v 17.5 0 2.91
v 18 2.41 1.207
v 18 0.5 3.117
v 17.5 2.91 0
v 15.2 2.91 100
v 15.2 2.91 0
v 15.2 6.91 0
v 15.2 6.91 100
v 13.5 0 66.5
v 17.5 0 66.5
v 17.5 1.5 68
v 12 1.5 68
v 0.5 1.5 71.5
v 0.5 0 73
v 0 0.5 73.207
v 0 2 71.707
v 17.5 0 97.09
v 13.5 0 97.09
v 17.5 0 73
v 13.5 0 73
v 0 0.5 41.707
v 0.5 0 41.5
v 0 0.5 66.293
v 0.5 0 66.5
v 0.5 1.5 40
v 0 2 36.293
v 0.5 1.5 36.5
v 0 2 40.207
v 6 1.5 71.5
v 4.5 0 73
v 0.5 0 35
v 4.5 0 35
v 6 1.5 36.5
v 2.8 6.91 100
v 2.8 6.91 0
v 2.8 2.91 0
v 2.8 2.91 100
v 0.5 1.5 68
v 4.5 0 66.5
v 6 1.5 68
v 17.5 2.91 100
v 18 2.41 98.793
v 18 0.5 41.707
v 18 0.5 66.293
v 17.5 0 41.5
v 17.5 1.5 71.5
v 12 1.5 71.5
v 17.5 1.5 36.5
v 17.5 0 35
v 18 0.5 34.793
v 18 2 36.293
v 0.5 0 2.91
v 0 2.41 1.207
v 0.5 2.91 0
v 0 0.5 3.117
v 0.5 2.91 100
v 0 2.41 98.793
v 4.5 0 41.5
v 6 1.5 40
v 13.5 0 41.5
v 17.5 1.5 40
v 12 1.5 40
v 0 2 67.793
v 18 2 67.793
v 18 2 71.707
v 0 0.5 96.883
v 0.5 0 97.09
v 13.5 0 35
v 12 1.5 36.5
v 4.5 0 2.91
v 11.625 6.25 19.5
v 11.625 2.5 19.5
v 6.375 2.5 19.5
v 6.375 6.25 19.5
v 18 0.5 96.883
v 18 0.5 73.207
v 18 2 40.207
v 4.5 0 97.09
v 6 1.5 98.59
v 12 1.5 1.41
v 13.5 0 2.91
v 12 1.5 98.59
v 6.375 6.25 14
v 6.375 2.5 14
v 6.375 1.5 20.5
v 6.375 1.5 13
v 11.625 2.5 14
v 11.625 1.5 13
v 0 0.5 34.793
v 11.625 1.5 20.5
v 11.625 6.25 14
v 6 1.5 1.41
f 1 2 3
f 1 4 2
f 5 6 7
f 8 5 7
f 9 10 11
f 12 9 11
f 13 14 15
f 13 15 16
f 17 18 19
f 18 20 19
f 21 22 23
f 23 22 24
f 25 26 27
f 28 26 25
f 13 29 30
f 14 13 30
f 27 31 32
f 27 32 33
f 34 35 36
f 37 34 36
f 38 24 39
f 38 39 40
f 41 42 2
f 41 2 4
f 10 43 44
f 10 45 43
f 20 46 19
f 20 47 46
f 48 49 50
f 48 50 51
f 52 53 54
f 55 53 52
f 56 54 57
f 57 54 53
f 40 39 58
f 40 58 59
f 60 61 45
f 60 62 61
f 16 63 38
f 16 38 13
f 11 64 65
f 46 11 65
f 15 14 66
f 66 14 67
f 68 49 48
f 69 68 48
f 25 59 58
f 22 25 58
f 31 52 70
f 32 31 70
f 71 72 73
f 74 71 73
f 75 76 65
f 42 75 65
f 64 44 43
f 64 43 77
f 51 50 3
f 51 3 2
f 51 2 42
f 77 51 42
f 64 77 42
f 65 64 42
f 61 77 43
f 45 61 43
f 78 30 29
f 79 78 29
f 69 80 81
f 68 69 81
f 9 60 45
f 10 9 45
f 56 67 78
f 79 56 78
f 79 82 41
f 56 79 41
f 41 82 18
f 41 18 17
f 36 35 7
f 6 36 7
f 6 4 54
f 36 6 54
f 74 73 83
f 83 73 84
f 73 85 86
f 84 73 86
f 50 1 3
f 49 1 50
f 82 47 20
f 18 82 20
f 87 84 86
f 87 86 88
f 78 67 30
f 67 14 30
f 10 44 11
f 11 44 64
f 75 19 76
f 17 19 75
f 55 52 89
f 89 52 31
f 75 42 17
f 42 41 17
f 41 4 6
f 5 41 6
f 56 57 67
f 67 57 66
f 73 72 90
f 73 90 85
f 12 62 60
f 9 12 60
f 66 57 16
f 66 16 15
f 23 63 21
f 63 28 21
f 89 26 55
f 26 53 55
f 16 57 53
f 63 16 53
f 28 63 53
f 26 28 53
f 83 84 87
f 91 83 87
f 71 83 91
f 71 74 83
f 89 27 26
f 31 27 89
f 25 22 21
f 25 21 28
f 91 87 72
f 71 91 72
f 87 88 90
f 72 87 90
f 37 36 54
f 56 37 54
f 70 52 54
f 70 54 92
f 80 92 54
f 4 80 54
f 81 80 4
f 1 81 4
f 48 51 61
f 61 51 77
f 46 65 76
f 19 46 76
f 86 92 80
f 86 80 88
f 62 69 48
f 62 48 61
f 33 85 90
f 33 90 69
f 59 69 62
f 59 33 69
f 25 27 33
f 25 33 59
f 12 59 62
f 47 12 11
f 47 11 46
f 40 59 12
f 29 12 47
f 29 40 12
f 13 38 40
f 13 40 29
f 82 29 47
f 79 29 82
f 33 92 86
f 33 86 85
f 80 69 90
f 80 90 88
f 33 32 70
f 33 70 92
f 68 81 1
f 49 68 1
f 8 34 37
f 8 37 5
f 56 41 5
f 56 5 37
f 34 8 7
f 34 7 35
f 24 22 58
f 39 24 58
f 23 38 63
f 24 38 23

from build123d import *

# Parameters (mm, degrees)
F1_DEPTH      = 100
F3_DEPTH      = 25
F3_DEPTH_BACK = 25
F4_SIZE       = 2.90999
F5_SIZE       = 2.90999
F7_DEPTH      = 6.25
F8_SIZE       = 1
F9_C1_SIZE    = 0.5
F9_C2_SIZE    = 0.5
F9_C3_SIZE    = 0.5
F9_C4_SIZE    = 0.5
F9_C5_SIZE    = 0.5
F9_C6_SIZE    = 0.5
F9_C7_SIZE    = 0.5
F9_C8_SIZE    = 0.5
F9_C9_SIZE    = 0.5
F9_C10_SIZE   = 0.5
F9_C11_SIZE   = 0.5
F9_C12_SIZE   = 0.5
F9_C13_SIZE   = 0.5
F9_C14_SIZE   = 0.5
F9_C15_SIZE   = 0.5
F9_C16_SIZE   = 0.5
F9_C17_SIZE   = 0.5
F9_C18_SIZE   = 0.5
F9_C19_SIZE   = 0.5
F9_C20_SIZE   = 0.5
F9_C21_SIZE   = 0.5
F9_C22_SIZE   = 0.5
F9_C23_SIZE   = 0.5
F9_C24_SIZE   = 0.5


# Not quite as in the source:
# - a fillet or chamfer is up to 0.001 mm smaller than in the source, because OpenCascade refuses the exact size


with BuildPart() as f1:
    # F0 (on Top) → F1 (new body)
    with BuildSketch(Plane.XY):
        Polygon((0, 2.91), (0, 0), (4.5, 0), (6, 1.5), (12, 1.5), (13.5, 0), (18, 0), (18, 2.91), (15.2, 2.91), (15.2, 6.91), (2.8, 6.91), (2.8, 2.91), align=None)
    extrude(amount=F1_DEPTH)

    # F2 (on Right) → F3 (cut, two sides)
    with BuildSketch(Plane.YZ) as f3_sk:
        Polygon((-0.9837878169, 0), (0, 0), (0, 35), (1.5, 36.5), (1.5, 40), (0, 41.5), (0, 66.5), (1.5, 68), (1.5, 71.5), (0, 73), (0, 100.0014618039), (-0.9837878169, 100.0014618039), align=None)
    extrude(amount=-F3_DEPTH, mode=Mode.SUBTRACT)
    extrude(f3_sk.sketch, amount=F3_DEPTH_BACK, mode=Mode.SUBTRACT)

    # F4 (size 2.91 in the source; OpenCascade refuses exactly that, so slightly less here)
    f4_edges = [f1.edges().sort_by_distance(p)[0] for p in [
        (2.25, 0, 0),
    ]]
    chamfer(f4_edges, length=F4_SIZE)

    # F5 (size 2.91 in the source; OpenCascade refuses exactly that, so slightly less here)
    f5_edges = [f1.edges().sort_by_distance(p)[0] for p in [
        (15.75, 0, 100),
    ]]
    chamfer(f5_edges, length=F5_SIZE)

    # F6 (on Front) → F7 (cut)
    with BuildSketch(Plane.XZ):
        Polygon((6.375, 14), (9, 14), (11.625, 14), (11.625, 19.5), (6.375, 19.5), align=None)
    extrude(amount=-F7_DEPTH, mode=Mode.SUBTRACT)

    # F8
    f8_edges = [f1.edges().sort_by_distance(p)[0] for p in [
        (9, 1.5, 14),
        (9, 1.5, 19.5),
    ]]
    chamfer(f8_edges, length=F8_SIZE)

    # F9: chamfer of 0.5 on 28 edges, made by hand

    # F9_c1
    f9_c1_edges = [f1.edges().sort_by_distance(p)[0] for p in [
        (18, 2.91, 50),
    ]]
    chamfer(f9_c1_edges, length=F9_C1_SIZE)

    # F9_c2
    f9_c2_edges = [f1.edges().sort_by_distance(p)[0] for p in [
        (0, 2.91, 50),
    ]]
    chamfer(f9_c2_edges, length=F9_C2_SIZE)

    # F9_c3
    f9_c3_edges = [f1.edges().sort_by_distance(p)[0] for p in [
        (18, 0, 18.954995),
    ]]
    chamfer(f9_c3_edges, length=F9_C3_SIZE)

    # F9_c4
    f9_c4_edges = [f1.edges().sort_by_distance(p)[0] for p in [
        (0, 0, 18.954995),
    ]]
    chamfer(f9_c4_edges, length=F9_C4_SIZE)

    # F9_c5
    f9_c5_edges = [f1.edges().sort_by_distance(p)[0] for p in [
        (18, 0, 54),
    ]]
    chamfer(f9_c5_edges, length=F9_C5_SIZE)

    # F9_c6
    f9_c6_edges = [f1.edges().sort_by_distance(p)[0] for p in [
        (0, 0, 54),
    ]]
    chamfer(f9_c6_edges, length=F9_C6_SIZE)

    # F9_c7
    f9_c7_edges = [f1.edges().sort_by_distance(p)[0] for p in [
        (0, 0, 85.045005),
    ]]
    chamfer(f9_c7_edges, length=F9_C7_SIZE)

    # F9_c8
    f9_c8_edges = [f1.edges().sort_by_distance(p)[0] for p in [
        (18, 0, 85.045005),
    ]]
    chamfer(f9_c8_edges, length=F9_C8_SIZE)

    # F9_c9
    f9_c9_edges = [f1.edges().sort_by_distance(p)[0] for p in [
        (18, 1.455, 1.45499),
    ]]
    chamfer(f9_c9_edges, length=F9_C9_SIZE)

    # F9_c10
    f9_c10_edges = [f1.edges().sort_by_distance(p)[0] for p in [
        (0, 1.455, 1.45499),
    ]]
    chamfer(f9_c10_edges, length=F9_C10_SIZE)

    # F9_c11
    f9_c11_edges = [f1.edges().sort_by_distance(p)[0] for p in [
        (18, 1.455, 98.54501),
    ]]
    chamfer(f9_c11_edges, length=F9_C11_SIZE)

    # F9_c12
    f9_c12_edges = [f1.edges().sort_by_distance(p)[0] for p in [
        (0, 1.455, 98.54501),
    ]]
    chamfer(f9_c12_edges, length=F9_C12_SIZE)

    # F9_c13
    f9_c13_edges = [f1.edges().sort_by_distance(p)[0] for p in [
        (18, 1.5, 69.75),
    ]]
    chamfer(f9_c13_edges, length=F9_C13_SIZE)

    # F9_c14
    f9_c14_edges = [f1.edges().sort_by_distance(p)[0] for p in [
        (0, 1.5, 69.75),
    ]]
    chamfer(f9_c14_edges, length=F9_C14_SIZE)

    # F9_c15
    f9_c15_edges = [f1.edges().sort_by_distance(p)[0] for p in [
        (18, 1.5, 38.25),
    ]]
    chamfer(f9_c15_edges, length=F9_C15_SIZE)

    # F9_c16
    f9_c16_edges = [f1.edges().sort_by_distance(p)[0] for p in [
        (0, 1.5, 38.25),
    ]]
    chamfer(f9_c16_edges, length=F9_C16_SIZE)

    # F9_c17
    f9_c17_edges = [f1.edges().sort_by_distance(p)[0] for p in [
        (18, 1, 36),
    ]]
    chamfer(f9_c17_edges, length=F9_C17_SIZE)

    # F9_c18
    f9_c18_edges = [f1.edges().sort_by_distance(p)[0] for p in [
        (18, 1, 40.5),
    ]]
    chamfer(f9_c18_edges, length=F9_C18_SIZE)

    # F9_c19
    f9_c19_edges = [f1.edges().sort_by_distance(p)[0] for p in [
        (0, 1, 72),
    ]]
    chamfer(f9_c19_edges, length=F9_C19_SIZE)

    # F9_c20
    f9_c20_edges = [f1.edges().sort_by_distance(p)[0] for p in [
        (18, 1, 72),
    ]]
    chamfer(f9_c20_edges, length=F9_C20_SIZE)

    # F9_c21
    f9_c21_edges = [f1.edges().sort_by_distance(p)[0] for p in [
        (18, 1, 67.5),
    ]]
    chamfer(f9_c21_edges, length=F9_C21_SIZE)

    # F9_c22
    f9_c22_edges = [f1.edges().sort_by_distance(p)[0] for p in [
        (0, 1, 36),
    ]]
    chamfer(f9_c22_edges, length=F9_C22_SIZE)

    # F9_c23
    f9_c23_edges = [f1.edges().sort_by_distance(p)[0] for p in [
        (0, 1, 40.5),
    ]]
    chamfer(f9_c23_edges, length=F9_C23_SIZE)

    # F9_c24
    f9_c24_edges = [f1.edges().sort_by_distance(p)[0] for p in [
        (0, 1, 67.5),
    ]]
    chamfer(f9_c24_edges, length=F9_C24_SIZE)


solid = f1.part
